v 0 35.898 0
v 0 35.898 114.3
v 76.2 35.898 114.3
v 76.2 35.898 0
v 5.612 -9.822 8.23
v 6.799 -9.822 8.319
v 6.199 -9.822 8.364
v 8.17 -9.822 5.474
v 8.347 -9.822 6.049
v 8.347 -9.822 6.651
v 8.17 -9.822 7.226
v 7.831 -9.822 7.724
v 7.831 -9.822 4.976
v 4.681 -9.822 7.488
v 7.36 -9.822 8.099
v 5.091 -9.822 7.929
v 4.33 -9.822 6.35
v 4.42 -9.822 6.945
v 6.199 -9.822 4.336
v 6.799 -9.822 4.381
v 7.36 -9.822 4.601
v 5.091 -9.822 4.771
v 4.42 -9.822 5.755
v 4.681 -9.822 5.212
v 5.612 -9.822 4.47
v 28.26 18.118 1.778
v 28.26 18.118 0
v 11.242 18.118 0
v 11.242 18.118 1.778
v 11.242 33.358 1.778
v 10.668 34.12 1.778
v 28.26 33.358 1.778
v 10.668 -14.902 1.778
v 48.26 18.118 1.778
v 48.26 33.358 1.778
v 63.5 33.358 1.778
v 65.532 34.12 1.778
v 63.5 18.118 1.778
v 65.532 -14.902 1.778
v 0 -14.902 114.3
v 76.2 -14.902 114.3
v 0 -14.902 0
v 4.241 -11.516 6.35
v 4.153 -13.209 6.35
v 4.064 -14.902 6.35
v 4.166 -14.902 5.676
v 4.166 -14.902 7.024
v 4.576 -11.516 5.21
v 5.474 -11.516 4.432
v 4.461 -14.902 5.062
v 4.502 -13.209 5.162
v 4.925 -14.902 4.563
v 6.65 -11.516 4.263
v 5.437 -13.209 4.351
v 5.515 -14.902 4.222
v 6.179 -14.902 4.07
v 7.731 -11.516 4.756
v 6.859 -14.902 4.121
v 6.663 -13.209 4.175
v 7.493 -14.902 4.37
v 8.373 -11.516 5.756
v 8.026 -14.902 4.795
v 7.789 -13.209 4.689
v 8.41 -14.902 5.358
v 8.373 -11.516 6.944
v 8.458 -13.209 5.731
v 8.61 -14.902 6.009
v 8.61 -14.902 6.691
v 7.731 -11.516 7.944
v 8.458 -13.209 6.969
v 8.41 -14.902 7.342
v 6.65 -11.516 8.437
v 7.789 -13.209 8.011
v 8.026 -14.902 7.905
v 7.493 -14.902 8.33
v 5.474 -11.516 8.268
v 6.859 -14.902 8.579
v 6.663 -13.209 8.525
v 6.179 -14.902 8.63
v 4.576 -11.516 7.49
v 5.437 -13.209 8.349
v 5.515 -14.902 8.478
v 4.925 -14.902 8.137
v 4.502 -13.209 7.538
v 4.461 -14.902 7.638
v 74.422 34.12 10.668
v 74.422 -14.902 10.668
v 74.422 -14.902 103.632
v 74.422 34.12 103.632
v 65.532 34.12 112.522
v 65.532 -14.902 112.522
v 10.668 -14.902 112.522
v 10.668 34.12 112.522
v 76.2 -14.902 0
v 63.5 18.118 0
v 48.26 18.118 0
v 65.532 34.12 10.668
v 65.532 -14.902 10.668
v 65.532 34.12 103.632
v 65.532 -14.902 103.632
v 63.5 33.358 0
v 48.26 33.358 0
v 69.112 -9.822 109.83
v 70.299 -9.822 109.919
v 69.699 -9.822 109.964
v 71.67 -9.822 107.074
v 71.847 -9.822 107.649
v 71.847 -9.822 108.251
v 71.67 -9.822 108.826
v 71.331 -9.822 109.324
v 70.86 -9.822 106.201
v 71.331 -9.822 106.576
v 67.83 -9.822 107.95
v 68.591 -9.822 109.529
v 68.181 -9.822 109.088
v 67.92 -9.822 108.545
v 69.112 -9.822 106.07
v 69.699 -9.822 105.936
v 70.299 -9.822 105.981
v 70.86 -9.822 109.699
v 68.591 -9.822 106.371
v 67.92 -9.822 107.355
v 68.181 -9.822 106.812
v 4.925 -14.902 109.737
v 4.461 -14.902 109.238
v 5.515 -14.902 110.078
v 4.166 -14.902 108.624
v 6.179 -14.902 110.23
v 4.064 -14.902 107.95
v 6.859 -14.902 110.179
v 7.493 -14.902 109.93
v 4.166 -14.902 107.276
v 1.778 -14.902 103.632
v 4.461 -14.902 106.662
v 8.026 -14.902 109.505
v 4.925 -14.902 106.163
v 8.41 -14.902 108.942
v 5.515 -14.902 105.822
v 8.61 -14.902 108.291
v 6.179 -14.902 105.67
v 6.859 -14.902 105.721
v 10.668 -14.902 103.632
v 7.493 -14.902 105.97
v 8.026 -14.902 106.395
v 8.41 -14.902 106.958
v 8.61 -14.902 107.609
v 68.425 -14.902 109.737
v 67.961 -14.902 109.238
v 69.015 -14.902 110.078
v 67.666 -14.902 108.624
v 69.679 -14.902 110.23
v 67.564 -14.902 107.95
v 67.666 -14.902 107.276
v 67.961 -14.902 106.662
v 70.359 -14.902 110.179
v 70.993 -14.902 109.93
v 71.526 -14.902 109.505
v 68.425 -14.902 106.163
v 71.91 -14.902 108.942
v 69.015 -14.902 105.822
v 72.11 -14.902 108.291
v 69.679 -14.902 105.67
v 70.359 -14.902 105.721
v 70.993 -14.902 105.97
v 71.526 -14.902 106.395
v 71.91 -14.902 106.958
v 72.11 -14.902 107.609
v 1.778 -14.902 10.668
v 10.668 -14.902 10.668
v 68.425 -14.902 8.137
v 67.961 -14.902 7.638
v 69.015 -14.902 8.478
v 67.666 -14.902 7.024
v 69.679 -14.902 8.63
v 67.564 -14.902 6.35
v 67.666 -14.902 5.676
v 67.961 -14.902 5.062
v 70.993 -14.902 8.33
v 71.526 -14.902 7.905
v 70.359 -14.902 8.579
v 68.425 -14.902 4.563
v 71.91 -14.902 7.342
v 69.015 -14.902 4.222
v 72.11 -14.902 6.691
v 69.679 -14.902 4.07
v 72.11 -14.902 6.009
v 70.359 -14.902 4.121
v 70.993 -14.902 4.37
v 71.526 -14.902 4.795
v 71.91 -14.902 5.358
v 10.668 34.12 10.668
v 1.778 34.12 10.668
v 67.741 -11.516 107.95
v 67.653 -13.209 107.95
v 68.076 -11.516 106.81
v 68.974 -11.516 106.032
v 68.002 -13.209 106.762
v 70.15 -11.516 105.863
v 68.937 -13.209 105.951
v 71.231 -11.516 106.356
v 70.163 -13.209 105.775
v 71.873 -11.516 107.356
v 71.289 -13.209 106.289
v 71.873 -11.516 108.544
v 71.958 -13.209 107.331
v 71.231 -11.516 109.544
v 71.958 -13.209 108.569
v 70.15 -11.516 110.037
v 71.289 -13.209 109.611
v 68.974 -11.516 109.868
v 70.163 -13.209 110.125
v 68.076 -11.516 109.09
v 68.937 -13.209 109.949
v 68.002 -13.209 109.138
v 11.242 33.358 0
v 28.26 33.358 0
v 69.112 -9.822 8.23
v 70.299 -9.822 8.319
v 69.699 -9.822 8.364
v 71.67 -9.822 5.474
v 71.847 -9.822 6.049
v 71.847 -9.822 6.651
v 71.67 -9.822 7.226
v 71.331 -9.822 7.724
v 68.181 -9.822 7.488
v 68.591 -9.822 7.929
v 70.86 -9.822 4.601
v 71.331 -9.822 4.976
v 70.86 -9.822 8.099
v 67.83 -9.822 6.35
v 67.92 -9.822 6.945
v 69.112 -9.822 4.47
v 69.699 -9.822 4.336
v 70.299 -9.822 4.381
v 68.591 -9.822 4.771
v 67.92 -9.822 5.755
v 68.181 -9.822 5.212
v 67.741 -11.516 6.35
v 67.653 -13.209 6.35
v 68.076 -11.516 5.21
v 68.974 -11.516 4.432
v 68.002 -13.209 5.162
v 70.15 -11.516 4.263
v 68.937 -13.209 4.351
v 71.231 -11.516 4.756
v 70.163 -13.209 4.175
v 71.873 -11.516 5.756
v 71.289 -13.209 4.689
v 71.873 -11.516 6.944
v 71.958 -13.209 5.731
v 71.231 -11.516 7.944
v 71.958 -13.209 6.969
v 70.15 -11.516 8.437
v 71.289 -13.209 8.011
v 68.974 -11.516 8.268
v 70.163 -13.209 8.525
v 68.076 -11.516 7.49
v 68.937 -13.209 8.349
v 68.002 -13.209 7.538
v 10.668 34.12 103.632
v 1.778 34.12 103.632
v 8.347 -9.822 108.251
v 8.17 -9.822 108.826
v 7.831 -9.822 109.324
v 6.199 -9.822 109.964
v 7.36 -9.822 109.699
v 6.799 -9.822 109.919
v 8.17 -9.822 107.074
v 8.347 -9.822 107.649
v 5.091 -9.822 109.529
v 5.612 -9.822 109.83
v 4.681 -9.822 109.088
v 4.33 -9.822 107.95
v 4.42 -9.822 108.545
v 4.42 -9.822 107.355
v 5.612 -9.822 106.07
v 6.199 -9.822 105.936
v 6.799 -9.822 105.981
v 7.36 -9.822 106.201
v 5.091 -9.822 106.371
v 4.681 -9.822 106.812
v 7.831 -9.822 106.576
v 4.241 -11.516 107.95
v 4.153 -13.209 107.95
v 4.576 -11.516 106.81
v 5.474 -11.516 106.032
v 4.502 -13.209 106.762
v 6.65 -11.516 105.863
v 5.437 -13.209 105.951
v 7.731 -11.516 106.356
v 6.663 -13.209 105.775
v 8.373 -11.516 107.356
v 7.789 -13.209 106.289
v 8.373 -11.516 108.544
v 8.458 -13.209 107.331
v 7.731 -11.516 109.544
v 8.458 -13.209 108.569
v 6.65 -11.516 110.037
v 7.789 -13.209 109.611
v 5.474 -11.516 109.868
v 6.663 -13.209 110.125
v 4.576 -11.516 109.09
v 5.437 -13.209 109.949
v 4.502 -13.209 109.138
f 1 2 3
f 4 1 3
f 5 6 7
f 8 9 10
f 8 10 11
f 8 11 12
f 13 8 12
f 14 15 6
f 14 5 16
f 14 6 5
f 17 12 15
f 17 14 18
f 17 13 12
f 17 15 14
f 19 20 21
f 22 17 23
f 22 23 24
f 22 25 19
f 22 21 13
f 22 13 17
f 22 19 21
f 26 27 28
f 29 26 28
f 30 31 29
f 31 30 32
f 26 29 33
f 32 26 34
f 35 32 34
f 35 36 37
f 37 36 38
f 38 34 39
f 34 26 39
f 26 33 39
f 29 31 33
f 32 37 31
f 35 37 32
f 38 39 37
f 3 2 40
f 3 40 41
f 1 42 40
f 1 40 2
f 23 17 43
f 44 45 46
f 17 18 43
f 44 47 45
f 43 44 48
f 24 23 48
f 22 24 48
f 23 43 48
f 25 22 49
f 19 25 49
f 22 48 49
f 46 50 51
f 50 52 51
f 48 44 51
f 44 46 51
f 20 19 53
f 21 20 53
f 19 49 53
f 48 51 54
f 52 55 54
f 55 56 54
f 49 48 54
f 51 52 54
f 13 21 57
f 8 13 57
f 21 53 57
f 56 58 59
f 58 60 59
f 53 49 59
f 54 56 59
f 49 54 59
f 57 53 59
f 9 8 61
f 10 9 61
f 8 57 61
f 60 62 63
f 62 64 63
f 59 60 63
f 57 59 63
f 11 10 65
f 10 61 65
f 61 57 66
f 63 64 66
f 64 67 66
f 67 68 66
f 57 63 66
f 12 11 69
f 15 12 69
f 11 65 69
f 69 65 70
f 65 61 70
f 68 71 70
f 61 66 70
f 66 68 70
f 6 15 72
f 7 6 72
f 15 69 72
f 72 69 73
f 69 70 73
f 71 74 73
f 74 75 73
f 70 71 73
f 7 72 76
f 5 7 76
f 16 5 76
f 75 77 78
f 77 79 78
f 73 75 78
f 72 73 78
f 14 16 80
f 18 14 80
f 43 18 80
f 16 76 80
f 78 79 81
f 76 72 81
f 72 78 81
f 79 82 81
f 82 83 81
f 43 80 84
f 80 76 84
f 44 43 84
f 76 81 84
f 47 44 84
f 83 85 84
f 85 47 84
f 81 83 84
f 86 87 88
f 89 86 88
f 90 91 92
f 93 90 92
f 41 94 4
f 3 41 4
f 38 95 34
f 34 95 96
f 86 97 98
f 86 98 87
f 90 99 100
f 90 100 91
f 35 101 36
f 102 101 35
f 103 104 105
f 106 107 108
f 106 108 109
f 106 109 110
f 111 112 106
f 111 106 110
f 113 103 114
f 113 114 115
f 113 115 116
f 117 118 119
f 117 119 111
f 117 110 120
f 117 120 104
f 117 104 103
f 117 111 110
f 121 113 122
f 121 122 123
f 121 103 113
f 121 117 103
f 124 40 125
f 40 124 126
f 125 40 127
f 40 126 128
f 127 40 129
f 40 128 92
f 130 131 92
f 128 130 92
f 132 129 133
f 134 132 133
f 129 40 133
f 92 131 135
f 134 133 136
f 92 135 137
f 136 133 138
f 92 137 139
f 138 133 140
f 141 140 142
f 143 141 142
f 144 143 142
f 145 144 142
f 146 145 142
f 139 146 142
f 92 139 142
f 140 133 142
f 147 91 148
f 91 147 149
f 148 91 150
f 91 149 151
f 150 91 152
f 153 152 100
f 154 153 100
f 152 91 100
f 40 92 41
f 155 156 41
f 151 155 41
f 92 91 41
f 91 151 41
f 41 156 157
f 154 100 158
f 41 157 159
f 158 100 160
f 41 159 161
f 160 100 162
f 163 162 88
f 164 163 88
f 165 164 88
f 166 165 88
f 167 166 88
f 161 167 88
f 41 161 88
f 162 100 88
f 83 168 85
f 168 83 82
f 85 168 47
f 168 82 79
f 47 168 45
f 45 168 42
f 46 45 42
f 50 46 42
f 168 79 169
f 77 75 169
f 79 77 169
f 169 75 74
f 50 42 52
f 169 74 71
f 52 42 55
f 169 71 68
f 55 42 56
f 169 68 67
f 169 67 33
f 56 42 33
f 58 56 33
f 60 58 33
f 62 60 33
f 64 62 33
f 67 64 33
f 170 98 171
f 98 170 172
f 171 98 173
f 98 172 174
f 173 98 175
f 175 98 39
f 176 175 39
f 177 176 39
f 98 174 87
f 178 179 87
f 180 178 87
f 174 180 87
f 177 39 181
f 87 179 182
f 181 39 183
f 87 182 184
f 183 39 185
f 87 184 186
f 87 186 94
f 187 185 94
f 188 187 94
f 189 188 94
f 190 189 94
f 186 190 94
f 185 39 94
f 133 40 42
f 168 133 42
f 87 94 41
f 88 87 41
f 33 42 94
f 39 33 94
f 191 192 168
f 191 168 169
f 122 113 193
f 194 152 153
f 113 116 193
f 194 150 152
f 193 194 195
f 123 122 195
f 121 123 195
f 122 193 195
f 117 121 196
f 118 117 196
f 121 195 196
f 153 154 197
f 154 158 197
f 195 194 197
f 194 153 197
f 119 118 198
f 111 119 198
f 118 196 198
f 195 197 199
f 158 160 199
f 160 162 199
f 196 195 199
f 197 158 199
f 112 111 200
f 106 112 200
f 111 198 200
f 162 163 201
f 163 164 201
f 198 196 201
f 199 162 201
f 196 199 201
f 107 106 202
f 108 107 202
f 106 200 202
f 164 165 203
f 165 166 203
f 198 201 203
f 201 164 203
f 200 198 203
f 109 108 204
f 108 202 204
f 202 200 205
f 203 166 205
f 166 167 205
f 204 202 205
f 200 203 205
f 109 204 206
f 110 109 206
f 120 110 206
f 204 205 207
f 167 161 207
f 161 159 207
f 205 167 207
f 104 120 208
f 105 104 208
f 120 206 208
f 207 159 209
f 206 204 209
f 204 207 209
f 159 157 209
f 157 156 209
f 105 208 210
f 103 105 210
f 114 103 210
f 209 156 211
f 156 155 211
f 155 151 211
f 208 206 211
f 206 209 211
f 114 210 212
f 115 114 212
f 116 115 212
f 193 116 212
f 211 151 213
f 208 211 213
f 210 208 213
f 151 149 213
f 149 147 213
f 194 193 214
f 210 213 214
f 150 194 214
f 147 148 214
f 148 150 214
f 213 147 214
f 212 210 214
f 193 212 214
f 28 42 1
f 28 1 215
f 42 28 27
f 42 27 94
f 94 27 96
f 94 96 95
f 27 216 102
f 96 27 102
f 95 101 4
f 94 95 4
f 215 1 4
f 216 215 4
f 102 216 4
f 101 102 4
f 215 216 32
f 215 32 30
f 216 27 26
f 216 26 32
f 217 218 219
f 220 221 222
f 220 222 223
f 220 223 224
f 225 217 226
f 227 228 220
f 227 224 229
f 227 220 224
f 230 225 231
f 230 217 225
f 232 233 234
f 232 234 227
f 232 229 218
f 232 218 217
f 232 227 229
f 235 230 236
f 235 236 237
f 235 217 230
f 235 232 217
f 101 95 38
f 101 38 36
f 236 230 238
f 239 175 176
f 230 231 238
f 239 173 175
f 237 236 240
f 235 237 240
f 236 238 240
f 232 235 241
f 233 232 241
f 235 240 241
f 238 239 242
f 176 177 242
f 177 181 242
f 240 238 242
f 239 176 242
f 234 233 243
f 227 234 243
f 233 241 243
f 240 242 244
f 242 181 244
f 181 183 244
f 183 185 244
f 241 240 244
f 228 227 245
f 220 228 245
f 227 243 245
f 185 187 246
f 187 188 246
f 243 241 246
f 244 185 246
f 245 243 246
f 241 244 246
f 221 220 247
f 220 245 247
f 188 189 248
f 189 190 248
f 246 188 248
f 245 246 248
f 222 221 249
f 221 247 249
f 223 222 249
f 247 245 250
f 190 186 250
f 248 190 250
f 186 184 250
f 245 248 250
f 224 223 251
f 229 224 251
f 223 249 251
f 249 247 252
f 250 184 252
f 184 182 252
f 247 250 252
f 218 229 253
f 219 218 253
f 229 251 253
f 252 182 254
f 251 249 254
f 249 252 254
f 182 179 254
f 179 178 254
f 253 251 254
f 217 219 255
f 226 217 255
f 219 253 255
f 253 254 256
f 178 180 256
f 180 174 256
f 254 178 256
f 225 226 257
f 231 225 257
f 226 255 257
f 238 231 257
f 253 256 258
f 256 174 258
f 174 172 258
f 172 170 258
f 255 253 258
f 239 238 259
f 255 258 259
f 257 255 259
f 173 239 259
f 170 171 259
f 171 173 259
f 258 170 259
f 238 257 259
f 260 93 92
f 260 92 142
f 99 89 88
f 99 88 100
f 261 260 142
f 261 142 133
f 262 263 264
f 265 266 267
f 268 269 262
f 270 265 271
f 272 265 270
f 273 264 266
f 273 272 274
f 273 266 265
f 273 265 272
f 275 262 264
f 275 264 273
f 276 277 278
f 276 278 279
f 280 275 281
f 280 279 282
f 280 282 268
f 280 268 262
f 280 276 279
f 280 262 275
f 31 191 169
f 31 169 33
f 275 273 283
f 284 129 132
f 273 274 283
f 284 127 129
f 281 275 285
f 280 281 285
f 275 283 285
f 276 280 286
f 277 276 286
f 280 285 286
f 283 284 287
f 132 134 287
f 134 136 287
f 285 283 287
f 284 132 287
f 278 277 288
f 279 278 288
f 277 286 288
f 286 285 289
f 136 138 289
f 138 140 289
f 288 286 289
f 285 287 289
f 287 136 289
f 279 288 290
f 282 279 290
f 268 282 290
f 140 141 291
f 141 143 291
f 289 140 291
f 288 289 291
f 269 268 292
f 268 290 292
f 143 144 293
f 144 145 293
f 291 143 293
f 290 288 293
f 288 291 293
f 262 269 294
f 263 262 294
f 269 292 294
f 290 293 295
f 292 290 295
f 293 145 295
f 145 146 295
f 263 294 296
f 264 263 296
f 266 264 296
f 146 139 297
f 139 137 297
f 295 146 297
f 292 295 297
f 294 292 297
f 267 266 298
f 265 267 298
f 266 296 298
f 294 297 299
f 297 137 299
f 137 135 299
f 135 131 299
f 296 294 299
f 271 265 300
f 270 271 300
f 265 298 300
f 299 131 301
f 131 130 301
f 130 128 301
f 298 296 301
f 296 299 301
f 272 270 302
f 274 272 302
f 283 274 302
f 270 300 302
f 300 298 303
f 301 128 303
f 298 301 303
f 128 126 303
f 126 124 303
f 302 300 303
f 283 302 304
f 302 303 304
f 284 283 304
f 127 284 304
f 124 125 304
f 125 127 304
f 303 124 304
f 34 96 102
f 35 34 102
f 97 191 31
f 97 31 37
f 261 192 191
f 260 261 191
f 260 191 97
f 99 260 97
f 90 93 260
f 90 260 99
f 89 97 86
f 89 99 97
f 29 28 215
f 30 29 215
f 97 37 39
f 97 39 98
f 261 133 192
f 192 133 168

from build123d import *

# Parameters (mm, degrees)
SKETCH1_W                    = 76.2
SKETCH1_H                    = 50.8
BOSS_EXTRUDE1_DEPTH          = 114.3
CUT_EXTRUDE2_DEPTH           = 49.022
SKETCH6_R                    = 2.286
CUT_EXTRUDE3_DEPTH           = 5.08
CUT_EXTRUDE3_DRAFT           = -3
CUT_EXTRUDE3_PROFILE_2_DEPTH = 5.08
CUT_EXTRUDE3_PROFILE_2_DRAFT = -3
CUT_EXTRUDE3_PROFILE_3_DEPTH = 5.08
CUT_EXTRUDE3_PROFILE_3_DRAFT = -3
CUT_EXTRUDE3_PROFILE_4_DEPTH = 5.08
CUT_EXTRUDE3_PROFILE_4_DRAFT = -3
SKETCH10_W                   = 15.24
SKETCH10_H                   = 15.24
SKETCH10_W_2                 = 17.018
CUT_EXTRUDE4_DEPTH           = 5.08


with BuildPart() as part:
    # Sketch1 → Boss-Extrude1 (new body)
    with BuildSketch(Plane.XY):
        with Locations((38.1, 10.497687861)):
            Rectangle(SKETCH1_W, SKETCH1_H)
    extrude(amount=BOSS_EXTRUDE1_DEPTH)

    # Sketch3 → Cut-Extrude2 (cut)
    with BuildSketch(Plane.XZ.offset(14.902312139)):
        Polygon((65.532, 112.522), (10.668, 112.522), (10.668, 103.632), (1.778, 103.632), (1.778, 10.668), (10.668, 10.668), (10.668, 1.778), (65.532, 1.778), (65.532, 10.668), (74.422, 10.668), (74.422, 103.632), (65.532, 103.632), align=None)
    extrude(amount=-CUT_EXTRUDE2_DEPTH, mode=Mode.SUBTRACT)


with BuildPart() as cut_extrude3_tool:
    # Sketch6 → Cut-Extrude3 (with draft: the straight prism first)
    with BuildSketch(Plane(origin=(0, -14.902312139, 0), x_dir=(-1, 0, 0), z_dir=(0, -1, 0))):
        with Locations((-69.85, -6.35)):
            Circle(SKETCH6_R)
    extrude(amount=-CUT_EXTRUDE3_DEPTH)
    # Cut-Extrude3: the draft: its side faces are tilted about the plane it starts from
    cut_extrude3_sides = [cut_extrude3_tool.faces().sort_by_distance(p)[0] for p in [
        (72.136, -12.362312139, 6.35),
    ]]
    draft(cut_extrude3_sides, Plane(origin=(0, -14.902312139, 0), x_dir=(-1, 0, 0), z_dir=(0, -1, 0)), CUT_EXTRUDE3_DRAFT)


with BuildPart() as part_1:
    add(part.part)

    # Cut-Extrude3: cut by cut_extrude3_tool
    add(cut_extrude3_tool.part, mode=Mode.SUBTRACT)


with BuildPart() as cut_extrude3_profile_2_tool:
    # Sketch6 → Cut-Extrude3 profile 2 (with draft: the straight prism first)
    with BuildSketch(Plane(origin=(0, -14.902312139, 0), x_dir=(-1, 0, 0), z_dir=(0, -1, 0))):
        with Locations((-6.35, -6.35)):
            Circle(SKETCH6_R)
    extrude(amount=-CUT_EXTRUDE3_PROFILE_2_DEPTH)
    # Cut-Extrude3 profile 2: the draft: its side faces are tilted about the plane it starts from
    cut_extrude3_profile_2_sides = [cut_extrude3_profile_2_tool.faces().sort_by_distance(p)[0] for p in [
        (8.636, -12.362312139, 6.35),
    ]]
    draft(cut_extrude3_profile_2_sides, Plane(origin=(0, -14.902312139, 0), x_dir=(-1, 0, 0), z_dir=(0, -1, 0)), CUT_EXTRUDE3_PROFILE_2_DRAFT)


with BuildPart() as part_2:
    add(part_1.part)

    # Cut-Extrude3 profile 2: cut by cut_extrude3_profile_2_tool
    add(cut_extrude3_profile_2_tool.part, mode=Mode.SUBTRACT)


with BuildPart() as cut_extrude3_profile_3_tool:
    # Sketch6 → Cut-Extrude3 profile 3 (with draft: the straight prism first)
    with BuildSketch(Plane(origin=(0, -14.902312139, 0), x_dir=(-1, 0, 0), z_dir=(0, -1, 0))):
        with Locations((-6.35, -107.95)):
            Circle(SKETCH6_R)
    extrude(amount=-CUT_EXTRUDE3_PROFILE_3_DEPTH)
    # Cut-Extrude3 profile 3: the draft: its side faces are tilted about the plane it starts from
    cut_extrude3_profile_3_sides = [cut_extrude3_profile_3_tool.faces().sort_by_distance(p)[0] for p in [
        (8.636, -12.362312139, 107.95),
    ]]
    draft(cut_extrude3_profile_3_sides, Plane(origin=(0, -14.902312139, 0), x_dir=(-1, 0, 0), z_dir=(0, -1, 0)), CUT_EXTRUDE3_PROFILE_3_DRAFT)


with BuildPart() as part_3:
    add(part_2.part)

    # Cut-Extrude3 profile 3: cut by cut_extrude3_profile_3_tool
    add(cut_extrude3_profile_3_tool.part, mode=Mode.SUBTRACT)


with BuildPart() as cut_extrude3_profile_4_tool:
    # Sketch6 → Cut-Extrude3 profile 4 (with draft: the straight prism first)
    with BuildSketch(Plane(origin=(0, -14.902312139, 0), x_dir=(-1, 0, 0), z_dir=(0, -1, 0))):
        with Locations((-69.85, -107.95)):
            Circle(SKETCH6_R)
    extrude(amount=-CUT_EXTRUDE3_PROFILE_4_DEPTH)
    # Cut-Extrude3 profile 4: the draft: its side faces are tilted about the plane it starts from
    cut_extrude3_profile_4_sides = [cut_extrude3_profile_4_tool.faces().sort_by_distance(p)[0] for p in [
        (72.136, -12.362312139, 107.95),
    ]]
    draft(cut_extrude3_profile_4_sides, Plane(origin=(0, -14.902312139, 0), x_dir=(-1, 0, 0), z_dir=(0, -1, 0)), CUT_EXTRUDE3_PROFILE_4_DRAFT)


with BuildPart() as part_4:
    add(part_3.part)

    # Cut-Extrude3 profile 4: cut by cut_extrude3_profile_4_tool
    add(cut_extrude3_profile_4_tool.part, mode=Mode.SUBTRACT)

    # Sketch10 → Cut-Extrude4 (cut)
    with BuildSketch(Plane(origin=(0, 0, 0), x_dir=(-1, 0, 0), z_dir=(0, 0, -1))):
        with Locations((-55.88, 25.737687861)):
            Rectangle(SKETCH10_W, SKETCH10_H)
        with Locations((-19.751, 25.737687861)):
            Rectangle(SKETCH10_W_2, SKETCH10_H)
    extrude(amount=-CUT_EXTRUDE4_DEPTH, mode=Mode.SUBTRACT)


solid = part_4.part
